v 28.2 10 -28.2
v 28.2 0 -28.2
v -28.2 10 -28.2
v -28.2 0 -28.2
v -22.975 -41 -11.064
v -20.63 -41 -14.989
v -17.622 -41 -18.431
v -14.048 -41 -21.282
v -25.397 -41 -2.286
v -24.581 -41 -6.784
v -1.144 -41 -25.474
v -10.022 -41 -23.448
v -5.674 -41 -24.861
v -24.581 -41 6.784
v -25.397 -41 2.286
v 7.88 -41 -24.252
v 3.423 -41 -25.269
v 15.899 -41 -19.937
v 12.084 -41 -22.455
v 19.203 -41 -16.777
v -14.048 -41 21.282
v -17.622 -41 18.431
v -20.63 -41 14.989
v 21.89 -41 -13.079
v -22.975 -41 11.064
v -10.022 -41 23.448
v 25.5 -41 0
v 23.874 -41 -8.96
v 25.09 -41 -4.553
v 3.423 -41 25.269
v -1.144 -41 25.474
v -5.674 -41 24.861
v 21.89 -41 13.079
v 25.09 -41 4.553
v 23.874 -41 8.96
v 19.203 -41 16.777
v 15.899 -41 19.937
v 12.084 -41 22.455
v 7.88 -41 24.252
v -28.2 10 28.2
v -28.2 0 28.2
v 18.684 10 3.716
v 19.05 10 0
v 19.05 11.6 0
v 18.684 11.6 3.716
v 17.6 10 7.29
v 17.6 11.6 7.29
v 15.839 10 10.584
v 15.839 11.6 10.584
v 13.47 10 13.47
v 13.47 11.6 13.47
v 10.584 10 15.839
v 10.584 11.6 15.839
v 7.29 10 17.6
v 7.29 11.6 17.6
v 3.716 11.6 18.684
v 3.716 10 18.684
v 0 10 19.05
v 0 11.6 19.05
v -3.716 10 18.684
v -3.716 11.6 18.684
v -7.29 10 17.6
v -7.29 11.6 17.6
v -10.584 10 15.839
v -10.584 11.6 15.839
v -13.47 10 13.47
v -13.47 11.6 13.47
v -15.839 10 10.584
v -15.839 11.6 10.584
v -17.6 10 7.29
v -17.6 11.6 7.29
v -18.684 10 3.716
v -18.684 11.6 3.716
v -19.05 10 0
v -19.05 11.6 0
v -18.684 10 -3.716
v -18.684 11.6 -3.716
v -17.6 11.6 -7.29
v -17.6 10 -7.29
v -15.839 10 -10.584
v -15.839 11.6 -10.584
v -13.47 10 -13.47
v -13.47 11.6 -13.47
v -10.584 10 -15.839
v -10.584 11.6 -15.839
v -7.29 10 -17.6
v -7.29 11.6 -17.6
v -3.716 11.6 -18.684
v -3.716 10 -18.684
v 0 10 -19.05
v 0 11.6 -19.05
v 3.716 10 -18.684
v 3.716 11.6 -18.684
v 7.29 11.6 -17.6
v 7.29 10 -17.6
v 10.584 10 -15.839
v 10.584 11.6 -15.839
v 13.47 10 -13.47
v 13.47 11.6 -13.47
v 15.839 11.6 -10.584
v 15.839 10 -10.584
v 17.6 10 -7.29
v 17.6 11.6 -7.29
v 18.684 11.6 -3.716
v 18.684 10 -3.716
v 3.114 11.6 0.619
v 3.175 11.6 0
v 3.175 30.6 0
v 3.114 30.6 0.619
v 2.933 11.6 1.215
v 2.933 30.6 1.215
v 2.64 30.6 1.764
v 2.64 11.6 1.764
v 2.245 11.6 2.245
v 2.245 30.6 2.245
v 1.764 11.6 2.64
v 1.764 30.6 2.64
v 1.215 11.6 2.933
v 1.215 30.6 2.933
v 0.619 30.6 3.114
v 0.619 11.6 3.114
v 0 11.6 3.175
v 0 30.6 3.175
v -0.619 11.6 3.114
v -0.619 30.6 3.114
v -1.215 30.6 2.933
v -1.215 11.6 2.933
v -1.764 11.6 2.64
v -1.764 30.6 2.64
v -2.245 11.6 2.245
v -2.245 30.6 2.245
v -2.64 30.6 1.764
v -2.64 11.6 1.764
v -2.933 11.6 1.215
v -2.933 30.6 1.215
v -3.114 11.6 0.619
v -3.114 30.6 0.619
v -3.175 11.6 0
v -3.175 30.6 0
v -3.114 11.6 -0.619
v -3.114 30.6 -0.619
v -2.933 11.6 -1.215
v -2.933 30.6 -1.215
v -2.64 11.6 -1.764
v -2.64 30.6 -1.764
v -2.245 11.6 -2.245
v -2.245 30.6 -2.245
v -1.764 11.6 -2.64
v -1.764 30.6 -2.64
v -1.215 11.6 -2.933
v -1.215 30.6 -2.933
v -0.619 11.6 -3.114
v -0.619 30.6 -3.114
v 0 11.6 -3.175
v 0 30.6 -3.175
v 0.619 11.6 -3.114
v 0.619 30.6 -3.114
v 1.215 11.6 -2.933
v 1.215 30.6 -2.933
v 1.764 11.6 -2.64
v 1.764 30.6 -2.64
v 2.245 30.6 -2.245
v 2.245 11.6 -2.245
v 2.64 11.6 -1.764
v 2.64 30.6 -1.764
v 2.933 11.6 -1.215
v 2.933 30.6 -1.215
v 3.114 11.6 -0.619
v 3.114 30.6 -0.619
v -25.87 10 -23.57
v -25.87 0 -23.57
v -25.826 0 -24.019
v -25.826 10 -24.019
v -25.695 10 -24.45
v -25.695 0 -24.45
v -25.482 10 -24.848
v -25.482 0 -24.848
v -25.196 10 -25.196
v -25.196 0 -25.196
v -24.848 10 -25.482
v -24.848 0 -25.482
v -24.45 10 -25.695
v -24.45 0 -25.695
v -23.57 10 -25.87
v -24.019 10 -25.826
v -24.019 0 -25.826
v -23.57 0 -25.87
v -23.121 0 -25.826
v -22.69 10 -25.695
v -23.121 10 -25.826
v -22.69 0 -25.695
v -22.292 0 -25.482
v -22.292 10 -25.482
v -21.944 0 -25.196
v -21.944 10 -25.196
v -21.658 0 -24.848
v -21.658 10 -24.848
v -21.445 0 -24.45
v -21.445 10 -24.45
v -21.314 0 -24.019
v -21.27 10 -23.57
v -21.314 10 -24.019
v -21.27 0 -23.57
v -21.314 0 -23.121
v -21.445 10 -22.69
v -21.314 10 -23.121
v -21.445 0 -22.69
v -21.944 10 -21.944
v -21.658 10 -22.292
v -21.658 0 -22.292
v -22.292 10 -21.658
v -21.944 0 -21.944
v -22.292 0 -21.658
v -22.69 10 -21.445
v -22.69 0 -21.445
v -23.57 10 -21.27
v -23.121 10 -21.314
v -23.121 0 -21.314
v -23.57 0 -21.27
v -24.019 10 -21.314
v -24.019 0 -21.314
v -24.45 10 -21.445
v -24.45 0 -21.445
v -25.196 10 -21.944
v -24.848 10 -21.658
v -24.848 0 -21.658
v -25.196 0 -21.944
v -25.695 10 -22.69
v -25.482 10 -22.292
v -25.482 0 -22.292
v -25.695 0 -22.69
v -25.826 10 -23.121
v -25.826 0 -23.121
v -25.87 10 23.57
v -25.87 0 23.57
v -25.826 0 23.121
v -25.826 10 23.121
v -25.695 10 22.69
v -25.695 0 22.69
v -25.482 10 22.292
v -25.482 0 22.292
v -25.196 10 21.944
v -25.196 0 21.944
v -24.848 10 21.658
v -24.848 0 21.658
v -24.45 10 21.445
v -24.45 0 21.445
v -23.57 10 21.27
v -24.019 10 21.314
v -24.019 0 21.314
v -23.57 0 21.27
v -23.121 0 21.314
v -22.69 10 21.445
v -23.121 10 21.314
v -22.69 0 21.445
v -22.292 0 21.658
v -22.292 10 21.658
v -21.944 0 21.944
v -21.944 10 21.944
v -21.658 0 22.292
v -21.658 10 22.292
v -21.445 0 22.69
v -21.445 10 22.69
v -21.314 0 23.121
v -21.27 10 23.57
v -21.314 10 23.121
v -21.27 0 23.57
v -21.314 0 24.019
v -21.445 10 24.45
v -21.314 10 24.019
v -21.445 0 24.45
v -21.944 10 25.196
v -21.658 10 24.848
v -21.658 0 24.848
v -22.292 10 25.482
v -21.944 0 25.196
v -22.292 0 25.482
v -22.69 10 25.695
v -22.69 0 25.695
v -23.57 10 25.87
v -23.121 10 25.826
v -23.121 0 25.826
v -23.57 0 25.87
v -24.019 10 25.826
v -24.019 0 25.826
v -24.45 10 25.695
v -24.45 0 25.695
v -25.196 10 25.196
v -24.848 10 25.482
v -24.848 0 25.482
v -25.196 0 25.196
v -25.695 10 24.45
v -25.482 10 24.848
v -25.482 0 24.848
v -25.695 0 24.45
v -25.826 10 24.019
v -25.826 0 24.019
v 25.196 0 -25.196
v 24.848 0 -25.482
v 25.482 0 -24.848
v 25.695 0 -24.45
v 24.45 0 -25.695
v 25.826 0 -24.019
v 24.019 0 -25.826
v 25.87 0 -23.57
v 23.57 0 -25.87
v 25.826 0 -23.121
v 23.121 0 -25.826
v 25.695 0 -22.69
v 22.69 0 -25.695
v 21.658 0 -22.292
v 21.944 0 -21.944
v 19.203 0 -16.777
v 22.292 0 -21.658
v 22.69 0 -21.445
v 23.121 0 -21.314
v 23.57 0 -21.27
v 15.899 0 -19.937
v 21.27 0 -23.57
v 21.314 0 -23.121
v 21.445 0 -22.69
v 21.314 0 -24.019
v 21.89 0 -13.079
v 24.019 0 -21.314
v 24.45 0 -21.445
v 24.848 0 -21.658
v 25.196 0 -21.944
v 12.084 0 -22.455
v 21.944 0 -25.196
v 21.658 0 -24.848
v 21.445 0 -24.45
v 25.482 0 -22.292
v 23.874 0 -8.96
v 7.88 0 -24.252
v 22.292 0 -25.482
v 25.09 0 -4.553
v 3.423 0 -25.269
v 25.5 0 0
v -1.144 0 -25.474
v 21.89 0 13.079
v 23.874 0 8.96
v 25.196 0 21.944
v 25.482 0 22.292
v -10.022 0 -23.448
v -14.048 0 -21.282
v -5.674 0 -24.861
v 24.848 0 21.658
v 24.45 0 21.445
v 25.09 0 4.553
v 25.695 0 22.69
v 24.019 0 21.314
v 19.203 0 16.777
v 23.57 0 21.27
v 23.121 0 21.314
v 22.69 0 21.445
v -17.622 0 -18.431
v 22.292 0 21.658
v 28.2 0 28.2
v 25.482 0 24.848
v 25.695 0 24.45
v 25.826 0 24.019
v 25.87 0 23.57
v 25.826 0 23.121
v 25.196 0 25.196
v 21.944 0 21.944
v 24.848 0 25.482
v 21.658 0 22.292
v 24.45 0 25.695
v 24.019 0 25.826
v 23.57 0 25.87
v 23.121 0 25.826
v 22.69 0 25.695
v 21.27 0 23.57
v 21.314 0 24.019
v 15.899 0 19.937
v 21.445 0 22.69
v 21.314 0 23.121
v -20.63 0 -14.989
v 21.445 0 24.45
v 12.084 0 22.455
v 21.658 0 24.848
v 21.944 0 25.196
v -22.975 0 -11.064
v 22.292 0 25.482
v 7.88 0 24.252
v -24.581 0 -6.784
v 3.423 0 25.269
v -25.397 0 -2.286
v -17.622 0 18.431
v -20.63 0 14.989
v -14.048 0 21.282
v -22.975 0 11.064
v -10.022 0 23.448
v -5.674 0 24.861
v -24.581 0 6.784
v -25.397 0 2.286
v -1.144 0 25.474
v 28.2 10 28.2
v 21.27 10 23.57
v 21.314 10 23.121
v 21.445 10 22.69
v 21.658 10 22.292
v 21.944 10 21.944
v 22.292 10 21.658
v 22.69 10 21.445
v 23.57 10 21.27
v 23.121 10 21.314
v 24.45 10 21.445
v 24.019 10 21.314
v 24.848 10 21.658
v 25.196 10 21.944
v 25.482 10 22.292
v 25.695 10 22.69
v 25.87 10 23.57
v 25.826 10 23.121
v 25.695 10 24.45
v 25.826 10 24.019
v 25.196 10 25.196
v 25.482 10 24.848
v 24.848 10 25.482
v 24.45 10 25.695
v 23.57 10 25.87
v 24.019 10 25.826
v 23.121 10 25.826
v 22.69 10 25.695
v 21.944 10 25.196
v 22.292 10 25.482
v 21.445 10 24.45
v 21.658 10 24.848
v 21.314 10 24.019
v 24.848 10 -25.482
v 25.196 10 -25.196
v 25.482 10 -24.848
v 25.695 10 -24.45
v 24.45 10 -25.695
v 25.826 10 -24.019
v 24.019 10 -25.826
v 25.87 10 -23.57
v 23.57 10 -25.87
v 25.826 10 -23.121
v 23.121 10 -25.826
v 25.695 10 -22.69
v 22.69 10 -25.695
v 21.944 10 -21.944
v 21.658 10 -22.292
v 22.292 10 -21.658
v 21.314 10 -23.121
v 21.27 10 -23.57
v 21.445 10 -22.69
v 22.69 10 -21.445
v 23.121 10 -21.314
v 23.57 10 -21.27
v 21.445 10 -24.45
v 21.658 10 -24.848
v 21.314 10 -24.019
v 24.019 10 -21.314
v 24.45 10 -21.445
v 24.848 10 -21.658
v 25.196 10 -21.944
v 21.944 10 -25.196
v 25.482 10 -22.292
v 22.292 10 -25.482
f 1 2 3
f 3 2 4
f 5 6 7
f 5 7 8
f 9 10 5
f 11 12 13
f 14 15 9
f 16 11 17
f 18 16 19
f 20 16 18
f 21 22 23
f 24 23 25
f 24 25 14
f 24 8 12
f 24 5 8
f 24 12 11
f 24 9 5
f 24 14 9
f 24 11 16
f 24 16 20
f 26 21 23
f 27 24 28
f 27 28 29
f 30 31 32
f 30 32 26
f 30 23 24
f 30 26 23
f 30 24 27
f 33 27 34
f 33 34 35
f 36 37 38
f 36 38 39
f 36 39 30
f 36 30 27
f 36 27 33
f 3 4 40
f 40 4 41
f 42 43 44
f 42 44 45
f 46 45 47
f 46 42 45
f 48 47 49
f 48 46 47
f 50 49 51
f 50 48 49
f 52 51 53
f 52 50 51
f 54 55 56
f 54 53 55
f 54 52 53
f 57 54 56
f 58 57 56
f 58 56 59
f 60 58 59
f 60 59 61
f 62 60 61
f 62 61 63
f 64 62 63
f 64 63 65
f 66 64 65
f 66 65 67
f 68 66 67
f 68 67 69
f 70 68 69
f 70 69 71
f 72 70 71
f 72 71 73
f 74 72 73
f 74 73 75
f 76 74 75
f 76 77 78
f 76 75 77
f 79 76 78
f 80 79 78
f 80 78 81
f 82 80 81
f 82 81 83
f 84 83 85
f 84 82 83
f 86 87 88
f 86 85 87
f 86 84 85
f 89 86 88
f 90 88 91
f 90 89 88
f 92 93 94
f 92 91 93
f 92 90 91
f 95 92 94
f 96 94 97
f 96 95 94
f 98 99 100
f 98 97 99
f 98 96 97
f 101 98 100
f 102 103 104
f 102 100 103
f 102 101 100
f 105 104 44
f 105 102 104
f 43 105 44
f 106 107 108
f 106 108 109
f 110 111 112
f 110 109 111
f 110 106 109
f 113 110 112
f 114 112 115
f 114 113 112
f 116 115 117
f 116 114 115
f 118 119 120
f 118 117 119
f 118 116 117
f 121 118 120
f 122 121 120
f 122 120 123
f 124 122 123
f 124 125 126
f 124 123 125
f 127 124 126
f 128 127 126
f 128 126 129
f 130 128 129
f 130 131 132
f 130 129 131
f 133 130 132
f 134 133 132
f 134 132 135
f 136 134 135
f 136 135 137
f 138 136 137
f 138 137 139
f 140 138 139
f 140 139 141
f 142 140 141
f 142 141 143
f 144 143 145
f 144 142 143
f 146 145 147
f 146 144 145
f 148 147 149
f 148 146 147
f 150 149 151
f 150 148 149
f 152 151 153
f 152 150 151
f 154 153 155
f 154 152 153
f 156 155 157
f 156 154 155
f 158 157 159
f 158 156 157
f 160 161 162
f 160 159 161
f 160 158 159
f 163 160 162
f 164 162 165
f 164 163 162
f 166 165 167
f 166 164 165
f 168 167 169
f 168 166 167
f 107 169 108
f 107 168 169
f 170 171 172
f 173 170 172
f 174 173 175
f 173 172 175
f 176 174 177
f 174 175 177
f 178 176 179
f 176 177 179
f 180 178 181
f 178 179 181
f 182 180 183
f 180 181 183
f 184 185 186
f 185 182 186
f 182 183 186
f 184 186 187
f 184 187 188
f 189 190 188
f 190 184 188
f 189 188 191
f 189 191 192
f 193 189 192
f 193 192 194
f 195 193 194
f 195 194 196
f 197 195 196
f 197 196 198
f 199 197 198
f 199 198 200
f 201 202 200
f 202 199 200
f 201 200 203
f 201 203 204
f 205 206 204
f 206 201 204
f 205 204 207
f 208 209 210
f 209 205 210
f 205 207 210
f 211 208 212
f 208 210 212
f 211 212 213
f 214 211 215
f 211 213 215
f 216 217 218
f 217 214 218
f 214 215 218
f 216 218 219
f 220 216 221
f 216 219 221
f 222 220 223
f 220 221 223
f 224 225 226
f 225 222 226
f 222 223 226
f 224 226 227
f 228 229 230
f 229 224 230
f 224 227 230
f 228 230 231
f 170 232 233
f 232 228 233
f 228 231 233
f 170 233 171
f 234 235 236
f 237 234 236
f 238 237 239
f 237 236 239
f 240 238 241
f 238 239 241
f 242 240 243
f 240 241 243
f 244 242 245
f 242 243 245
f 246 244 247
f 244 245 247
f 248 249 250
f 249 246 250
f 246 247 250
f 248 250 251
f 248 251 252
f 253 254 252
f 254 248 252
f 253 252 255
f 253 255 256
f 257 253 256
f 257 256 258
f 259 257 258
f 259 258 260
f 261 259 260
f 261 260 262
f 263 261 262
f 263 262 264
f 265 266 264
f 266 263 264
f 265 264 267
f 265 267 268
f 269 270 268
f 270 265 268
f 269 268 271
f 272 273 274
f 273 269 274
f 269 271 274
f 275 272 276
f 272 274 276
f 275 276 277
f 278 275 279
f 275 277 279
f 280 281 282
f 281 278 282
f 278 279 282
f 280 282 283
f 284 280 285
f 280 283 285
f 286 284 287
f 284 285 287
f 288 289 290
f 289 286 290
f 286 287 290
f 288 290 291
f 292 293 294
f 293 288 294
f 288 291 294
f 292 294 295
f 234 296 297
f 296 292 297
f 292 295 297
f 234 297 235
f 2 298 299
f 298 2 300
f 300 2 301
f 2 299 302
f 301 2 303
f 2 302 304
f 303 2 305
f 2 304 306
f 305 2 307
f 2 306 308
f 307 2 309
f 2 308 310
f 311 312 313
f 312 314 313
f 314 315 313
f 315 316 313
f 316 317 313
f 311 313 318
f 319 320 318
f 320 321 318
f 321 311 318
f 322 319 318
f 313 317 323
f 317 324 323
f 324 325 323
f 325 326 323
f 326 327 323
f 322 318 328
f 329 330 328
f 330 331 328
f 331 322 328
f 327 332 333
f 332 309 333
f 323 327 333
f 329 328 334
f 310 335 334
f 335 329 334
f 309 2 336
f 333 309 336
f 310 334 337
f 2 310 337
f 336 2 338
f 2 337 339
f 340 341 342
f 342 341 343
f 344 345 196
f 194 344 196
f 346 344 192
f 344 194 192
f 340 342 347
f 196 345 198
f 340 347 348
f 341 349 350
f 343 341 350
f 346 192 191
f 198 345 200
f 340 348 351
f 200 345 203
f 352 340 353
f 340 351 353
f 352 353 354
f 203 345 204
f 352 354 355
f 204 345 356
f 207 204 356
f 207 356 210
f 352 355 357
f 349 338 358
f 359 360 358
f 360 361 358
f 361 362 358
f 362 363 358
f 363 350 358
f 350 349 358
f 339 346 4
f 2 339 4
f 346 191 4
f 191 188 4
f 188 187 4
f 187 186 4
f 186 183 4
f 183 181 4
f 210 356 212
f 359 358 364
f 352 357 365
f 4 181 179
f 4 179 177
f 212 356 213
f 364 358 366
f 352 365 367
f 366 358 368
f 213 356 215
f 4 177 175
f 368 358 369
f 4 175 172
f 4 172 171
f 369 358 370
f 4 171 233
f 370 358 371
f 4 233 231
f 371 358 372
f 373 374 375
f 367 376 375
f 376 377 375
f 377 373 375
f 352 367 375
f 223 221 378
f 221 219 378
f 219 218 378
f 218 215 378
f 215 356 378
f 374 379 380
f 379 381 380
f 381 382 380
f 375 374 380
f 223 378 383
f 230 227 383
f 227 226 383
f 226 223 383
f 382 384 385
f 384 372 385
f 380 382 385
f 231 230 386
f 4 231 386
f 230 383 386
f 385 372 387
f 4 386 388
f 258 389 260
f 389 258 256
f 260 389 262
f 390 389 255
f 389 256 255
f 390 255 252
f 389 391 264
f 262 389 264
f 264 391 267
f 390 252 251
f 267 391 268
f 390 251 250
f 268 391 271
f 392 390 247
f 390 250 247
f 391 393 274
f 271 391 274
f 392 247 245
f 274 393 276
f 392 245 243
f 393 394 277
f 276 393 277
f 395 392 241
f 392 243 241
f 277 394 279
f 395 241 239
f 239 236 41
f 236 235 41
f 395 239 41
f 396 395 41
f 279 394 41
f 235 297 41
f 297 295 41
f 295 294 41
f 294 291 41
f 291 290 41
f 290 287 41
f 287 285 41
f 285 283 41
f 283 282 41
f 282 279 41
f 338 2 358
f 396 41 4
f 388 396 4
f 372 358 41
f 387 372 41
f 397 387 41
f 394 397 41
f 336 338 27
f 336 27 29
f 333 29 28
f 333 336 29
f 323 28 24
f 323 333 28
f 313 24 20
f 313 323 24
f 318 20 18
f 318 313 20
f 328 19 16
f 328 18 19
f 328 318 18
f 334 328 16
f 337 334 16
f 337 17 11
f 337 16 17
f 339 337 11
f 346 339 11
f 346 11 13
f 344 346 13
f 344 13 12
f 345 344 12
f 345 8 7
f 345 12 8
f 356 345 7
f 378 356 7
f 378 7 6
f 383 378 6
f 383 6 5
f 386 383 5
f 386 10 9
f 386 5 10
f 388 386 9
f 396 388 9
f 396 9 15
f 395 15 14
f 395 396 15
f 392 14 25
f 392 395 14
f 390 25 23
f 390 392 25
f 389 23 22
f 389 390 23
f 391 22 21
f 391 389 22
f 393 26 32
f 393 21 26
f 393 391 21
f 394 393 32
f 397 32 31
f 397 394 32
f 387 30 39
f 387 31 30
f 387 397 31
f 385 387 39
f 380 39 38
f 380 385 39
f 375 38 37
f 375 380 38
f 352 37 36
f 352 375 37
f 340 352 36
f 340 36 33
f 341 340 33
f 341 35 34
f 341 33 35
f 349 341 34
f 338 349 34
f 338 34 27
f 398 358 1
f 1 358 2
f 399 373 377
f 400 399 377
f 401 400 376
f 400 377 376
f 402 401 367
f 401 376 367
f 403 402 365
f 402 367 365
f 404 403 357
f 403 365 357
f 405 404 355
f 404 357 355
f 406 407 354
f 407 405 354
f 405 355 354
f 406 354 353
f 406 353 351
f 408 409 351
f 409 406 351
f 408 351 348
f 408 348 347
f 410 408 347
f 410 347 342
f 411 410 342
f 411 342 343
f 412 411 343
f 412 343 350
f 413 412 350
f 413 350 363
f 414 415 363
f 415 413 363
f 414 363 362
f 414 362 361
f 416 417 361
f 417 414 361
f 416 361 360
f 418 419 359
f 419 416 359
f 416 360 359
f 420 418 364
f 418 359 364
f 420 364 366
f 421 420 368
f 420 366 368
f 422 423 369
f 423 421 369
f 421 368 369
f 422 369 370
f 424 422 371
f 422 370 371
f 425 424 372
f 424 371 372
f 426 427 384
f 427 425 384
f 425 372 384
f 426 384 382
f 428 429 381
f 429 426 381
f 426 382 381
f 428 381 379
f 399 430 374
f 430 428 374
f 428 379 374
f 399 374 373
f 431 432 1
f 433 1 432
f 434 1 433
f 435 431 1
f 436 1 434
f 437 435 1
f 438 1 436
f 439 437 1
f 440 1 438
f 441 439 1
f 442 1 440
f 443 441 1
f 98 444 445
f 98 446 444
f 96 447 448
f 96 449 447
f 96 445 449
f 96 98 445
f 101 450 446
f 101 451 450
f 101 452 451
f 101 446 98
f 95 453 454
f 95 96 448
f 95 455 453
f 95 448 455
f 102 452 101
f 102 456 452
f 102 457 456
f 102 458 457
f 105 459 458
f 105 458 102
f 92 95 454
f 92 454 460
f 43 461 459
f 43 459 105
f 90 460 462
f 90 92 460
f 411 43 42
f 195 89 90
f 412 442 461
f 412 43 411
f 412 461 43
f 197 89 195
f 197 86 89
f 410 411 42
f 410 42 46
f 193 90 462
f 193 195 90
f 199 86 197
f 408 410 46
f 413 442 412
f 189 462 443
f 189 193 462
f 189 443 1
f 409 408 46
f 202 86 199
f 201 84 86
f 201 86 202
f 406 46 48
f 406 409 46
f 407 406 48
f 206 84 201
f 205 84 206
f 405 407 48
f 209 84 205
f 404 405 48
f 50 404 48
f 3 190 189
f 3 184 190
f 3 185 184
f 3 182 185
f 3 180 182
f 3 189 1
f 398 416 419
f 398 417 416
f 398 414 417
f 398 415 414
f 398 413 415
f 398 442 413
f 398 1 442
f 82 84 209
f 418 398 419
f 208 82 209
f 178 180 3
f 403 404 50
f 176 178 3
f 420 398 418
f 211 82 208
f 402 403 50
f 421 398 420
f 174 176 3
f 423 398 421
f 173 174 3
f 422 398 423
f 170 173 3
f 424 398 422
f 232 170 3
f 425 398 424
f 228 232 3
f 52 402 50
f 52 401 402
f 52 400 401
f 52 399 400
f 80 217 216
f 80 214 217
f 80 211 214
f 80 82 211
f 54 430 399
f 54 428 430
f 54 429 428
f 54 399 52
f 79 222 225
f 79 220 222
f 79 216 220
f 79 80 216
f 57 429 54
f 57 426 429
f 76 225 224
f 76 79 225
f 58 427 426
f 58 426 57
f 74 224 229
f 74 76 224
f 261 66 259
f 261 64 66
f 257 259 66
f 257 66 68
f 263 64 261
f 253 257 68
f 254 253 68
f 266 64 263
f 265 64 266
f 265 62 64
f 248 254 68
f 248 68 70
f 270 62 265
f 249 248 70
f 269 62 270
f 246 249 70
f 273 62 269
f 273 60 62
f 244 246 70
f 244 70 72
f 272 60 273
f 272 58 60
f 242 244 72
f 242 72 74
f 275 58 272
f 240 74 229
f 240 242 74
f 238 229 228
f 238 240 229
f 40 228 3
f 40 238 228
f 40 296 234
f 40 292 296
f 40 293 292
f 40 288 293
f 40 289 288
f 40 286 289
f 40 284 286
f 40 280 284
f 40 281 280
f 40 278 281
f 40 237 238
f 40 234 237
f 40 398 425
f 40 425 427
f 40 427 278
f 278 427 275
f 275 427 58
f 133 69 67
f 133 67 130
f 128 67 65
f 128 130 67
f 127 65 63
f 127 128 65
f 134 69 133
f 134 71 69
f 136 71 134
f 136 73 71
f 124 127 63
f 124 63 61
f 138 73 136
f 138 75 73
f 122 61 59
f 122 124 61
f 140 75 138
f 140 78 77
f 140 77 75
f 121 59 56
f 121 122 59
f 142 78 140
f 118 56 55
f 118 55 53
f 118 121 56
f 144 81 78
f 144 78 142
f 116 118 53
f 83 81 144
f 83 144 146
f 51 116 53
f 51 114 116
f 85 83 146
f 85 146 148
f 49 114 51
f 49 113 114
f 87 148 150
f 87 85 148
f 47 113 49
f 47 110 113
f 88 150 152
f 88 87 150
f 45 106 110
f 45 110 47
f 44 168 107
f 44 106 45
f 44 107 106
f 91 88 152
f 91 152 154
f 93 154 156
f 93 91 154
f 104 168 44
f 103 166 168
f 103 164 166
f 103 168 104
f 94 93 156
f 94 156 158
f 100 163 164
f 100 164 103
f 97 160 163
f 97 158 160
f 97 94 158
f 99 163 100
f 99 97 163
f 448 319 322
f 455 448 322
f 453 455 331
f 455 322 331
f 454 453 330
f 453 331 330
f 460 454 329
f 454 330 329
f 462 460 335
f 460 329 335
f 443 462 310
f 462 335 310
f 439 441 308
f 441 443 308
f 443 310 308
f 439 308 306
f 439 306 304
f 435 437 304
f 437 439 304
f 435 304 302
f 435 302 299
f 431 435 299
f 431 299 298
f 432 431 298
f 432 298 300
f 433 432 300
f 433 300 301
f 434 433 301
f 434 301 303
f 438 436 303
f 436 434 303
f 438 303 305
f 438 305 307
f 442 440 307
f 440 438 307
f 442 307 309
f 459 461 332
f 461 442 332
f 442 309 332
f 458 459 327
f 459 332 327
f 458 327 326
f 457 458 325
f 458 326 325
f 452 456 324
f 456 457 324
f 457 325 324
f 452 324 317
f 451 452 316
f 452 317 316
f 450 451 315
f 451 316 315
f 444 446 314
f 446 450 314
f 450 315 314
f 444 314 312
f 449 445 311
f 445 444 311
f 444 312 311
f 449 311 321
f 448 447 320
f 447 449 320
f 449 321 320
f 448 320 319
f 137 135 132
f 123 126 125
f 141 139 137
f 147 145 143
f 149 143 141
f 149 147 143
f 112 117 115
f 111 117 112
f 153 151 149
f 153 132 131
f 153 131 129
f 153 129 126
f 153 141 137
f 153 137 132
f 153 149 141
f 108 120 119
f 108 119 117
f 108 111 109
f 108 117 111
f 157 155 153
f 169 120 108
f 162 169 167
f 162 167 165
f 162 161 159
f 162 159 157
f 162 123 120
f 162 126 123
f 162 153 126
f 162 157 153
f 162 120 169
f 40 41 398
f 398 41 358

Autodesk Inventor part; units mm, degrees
ref_plane "YZ Plane" through (0, 0, 0) normal (1, 0, 0) x (0, 1, 0)
ref_plane "XZ Plane" through (0, 0, 0) normal (0, 1, 0) x (-1, 0, 0)
ref_plane "XY Plane" through (0, 0, 0) normal (0, 0, 1) x (1, 0, 0)
sketch "Sketch1" plane through (0, 0, 0) normal (0, 1, 0) x (-1, 0, 0)
  line L0 (28.2, 28.2) -> (-28.2, 28.2)
  line L1 (-28.2, 28.2) -> (-28.2, -28.2)
  line L2 (-28.2, -28.2) -> (28.2, -28.2)
  line L3 (28.2, -28.2) -> (28.2, 28.2)
  line L4 (28.2, 28.2) -> (-28.2, -28.2) construction
  line L5 (-28.2, 28.2) -> (28.2, -28.2) construction
  line L6 (0, 28.2) -> (0, -28.2) construction
  line L7 (28.2, 0) -> (-28.2, 0) construction
  circle A0 centre (23.57, 23.57) radius 2.3
  circle A1 centre (23.57, -23.57) radius 2.3
  circle A2 centre (-23.57, 23.57) radius 2.3
  circle A3 centre (-23.57, -23.57) radius 2.3
  point P0 (0, 0)
  dimension "d0" = 56.4
  dimension "d1" = 56.4
  dimension "d2" = 4.6
  dimension "d5" = 47.14
  dimension "d6" = 47.14
extrude "Extrusion1" add sketch "Sketch1" along normal blind 10
sketch "Sketch2" plane through (0, 0, 0) normal (0, -1, 0) x (1, 0, 0)
  circle A0 centre (0, 0) radius 25.5
  dimension "d9" = 51
extrude "Extrusion2" add sketch "Sketch2" along normal blind 41
sketch "Sketch3" plane through (0, 10, 0) normal (0, 1, 0) x (1, 0, 0)
  circle A0 centre (0, 0) radius 19.05
  dimension "d12" = 38.1
extrude "Extrusion3" add sketch "Sketch3" along normal blind 1.6
sketch "Sketch4" plane through (0, 11.6, 0) normal (0, 1, 0) x (1, 0, 0)
  circle A0 centre (0, 0) radius 3.175
  dimension "d15" = 6.35
extrude "Extrusion4" add sketch "Sketch4" along normal blind 19
properties part number "Motor model"
